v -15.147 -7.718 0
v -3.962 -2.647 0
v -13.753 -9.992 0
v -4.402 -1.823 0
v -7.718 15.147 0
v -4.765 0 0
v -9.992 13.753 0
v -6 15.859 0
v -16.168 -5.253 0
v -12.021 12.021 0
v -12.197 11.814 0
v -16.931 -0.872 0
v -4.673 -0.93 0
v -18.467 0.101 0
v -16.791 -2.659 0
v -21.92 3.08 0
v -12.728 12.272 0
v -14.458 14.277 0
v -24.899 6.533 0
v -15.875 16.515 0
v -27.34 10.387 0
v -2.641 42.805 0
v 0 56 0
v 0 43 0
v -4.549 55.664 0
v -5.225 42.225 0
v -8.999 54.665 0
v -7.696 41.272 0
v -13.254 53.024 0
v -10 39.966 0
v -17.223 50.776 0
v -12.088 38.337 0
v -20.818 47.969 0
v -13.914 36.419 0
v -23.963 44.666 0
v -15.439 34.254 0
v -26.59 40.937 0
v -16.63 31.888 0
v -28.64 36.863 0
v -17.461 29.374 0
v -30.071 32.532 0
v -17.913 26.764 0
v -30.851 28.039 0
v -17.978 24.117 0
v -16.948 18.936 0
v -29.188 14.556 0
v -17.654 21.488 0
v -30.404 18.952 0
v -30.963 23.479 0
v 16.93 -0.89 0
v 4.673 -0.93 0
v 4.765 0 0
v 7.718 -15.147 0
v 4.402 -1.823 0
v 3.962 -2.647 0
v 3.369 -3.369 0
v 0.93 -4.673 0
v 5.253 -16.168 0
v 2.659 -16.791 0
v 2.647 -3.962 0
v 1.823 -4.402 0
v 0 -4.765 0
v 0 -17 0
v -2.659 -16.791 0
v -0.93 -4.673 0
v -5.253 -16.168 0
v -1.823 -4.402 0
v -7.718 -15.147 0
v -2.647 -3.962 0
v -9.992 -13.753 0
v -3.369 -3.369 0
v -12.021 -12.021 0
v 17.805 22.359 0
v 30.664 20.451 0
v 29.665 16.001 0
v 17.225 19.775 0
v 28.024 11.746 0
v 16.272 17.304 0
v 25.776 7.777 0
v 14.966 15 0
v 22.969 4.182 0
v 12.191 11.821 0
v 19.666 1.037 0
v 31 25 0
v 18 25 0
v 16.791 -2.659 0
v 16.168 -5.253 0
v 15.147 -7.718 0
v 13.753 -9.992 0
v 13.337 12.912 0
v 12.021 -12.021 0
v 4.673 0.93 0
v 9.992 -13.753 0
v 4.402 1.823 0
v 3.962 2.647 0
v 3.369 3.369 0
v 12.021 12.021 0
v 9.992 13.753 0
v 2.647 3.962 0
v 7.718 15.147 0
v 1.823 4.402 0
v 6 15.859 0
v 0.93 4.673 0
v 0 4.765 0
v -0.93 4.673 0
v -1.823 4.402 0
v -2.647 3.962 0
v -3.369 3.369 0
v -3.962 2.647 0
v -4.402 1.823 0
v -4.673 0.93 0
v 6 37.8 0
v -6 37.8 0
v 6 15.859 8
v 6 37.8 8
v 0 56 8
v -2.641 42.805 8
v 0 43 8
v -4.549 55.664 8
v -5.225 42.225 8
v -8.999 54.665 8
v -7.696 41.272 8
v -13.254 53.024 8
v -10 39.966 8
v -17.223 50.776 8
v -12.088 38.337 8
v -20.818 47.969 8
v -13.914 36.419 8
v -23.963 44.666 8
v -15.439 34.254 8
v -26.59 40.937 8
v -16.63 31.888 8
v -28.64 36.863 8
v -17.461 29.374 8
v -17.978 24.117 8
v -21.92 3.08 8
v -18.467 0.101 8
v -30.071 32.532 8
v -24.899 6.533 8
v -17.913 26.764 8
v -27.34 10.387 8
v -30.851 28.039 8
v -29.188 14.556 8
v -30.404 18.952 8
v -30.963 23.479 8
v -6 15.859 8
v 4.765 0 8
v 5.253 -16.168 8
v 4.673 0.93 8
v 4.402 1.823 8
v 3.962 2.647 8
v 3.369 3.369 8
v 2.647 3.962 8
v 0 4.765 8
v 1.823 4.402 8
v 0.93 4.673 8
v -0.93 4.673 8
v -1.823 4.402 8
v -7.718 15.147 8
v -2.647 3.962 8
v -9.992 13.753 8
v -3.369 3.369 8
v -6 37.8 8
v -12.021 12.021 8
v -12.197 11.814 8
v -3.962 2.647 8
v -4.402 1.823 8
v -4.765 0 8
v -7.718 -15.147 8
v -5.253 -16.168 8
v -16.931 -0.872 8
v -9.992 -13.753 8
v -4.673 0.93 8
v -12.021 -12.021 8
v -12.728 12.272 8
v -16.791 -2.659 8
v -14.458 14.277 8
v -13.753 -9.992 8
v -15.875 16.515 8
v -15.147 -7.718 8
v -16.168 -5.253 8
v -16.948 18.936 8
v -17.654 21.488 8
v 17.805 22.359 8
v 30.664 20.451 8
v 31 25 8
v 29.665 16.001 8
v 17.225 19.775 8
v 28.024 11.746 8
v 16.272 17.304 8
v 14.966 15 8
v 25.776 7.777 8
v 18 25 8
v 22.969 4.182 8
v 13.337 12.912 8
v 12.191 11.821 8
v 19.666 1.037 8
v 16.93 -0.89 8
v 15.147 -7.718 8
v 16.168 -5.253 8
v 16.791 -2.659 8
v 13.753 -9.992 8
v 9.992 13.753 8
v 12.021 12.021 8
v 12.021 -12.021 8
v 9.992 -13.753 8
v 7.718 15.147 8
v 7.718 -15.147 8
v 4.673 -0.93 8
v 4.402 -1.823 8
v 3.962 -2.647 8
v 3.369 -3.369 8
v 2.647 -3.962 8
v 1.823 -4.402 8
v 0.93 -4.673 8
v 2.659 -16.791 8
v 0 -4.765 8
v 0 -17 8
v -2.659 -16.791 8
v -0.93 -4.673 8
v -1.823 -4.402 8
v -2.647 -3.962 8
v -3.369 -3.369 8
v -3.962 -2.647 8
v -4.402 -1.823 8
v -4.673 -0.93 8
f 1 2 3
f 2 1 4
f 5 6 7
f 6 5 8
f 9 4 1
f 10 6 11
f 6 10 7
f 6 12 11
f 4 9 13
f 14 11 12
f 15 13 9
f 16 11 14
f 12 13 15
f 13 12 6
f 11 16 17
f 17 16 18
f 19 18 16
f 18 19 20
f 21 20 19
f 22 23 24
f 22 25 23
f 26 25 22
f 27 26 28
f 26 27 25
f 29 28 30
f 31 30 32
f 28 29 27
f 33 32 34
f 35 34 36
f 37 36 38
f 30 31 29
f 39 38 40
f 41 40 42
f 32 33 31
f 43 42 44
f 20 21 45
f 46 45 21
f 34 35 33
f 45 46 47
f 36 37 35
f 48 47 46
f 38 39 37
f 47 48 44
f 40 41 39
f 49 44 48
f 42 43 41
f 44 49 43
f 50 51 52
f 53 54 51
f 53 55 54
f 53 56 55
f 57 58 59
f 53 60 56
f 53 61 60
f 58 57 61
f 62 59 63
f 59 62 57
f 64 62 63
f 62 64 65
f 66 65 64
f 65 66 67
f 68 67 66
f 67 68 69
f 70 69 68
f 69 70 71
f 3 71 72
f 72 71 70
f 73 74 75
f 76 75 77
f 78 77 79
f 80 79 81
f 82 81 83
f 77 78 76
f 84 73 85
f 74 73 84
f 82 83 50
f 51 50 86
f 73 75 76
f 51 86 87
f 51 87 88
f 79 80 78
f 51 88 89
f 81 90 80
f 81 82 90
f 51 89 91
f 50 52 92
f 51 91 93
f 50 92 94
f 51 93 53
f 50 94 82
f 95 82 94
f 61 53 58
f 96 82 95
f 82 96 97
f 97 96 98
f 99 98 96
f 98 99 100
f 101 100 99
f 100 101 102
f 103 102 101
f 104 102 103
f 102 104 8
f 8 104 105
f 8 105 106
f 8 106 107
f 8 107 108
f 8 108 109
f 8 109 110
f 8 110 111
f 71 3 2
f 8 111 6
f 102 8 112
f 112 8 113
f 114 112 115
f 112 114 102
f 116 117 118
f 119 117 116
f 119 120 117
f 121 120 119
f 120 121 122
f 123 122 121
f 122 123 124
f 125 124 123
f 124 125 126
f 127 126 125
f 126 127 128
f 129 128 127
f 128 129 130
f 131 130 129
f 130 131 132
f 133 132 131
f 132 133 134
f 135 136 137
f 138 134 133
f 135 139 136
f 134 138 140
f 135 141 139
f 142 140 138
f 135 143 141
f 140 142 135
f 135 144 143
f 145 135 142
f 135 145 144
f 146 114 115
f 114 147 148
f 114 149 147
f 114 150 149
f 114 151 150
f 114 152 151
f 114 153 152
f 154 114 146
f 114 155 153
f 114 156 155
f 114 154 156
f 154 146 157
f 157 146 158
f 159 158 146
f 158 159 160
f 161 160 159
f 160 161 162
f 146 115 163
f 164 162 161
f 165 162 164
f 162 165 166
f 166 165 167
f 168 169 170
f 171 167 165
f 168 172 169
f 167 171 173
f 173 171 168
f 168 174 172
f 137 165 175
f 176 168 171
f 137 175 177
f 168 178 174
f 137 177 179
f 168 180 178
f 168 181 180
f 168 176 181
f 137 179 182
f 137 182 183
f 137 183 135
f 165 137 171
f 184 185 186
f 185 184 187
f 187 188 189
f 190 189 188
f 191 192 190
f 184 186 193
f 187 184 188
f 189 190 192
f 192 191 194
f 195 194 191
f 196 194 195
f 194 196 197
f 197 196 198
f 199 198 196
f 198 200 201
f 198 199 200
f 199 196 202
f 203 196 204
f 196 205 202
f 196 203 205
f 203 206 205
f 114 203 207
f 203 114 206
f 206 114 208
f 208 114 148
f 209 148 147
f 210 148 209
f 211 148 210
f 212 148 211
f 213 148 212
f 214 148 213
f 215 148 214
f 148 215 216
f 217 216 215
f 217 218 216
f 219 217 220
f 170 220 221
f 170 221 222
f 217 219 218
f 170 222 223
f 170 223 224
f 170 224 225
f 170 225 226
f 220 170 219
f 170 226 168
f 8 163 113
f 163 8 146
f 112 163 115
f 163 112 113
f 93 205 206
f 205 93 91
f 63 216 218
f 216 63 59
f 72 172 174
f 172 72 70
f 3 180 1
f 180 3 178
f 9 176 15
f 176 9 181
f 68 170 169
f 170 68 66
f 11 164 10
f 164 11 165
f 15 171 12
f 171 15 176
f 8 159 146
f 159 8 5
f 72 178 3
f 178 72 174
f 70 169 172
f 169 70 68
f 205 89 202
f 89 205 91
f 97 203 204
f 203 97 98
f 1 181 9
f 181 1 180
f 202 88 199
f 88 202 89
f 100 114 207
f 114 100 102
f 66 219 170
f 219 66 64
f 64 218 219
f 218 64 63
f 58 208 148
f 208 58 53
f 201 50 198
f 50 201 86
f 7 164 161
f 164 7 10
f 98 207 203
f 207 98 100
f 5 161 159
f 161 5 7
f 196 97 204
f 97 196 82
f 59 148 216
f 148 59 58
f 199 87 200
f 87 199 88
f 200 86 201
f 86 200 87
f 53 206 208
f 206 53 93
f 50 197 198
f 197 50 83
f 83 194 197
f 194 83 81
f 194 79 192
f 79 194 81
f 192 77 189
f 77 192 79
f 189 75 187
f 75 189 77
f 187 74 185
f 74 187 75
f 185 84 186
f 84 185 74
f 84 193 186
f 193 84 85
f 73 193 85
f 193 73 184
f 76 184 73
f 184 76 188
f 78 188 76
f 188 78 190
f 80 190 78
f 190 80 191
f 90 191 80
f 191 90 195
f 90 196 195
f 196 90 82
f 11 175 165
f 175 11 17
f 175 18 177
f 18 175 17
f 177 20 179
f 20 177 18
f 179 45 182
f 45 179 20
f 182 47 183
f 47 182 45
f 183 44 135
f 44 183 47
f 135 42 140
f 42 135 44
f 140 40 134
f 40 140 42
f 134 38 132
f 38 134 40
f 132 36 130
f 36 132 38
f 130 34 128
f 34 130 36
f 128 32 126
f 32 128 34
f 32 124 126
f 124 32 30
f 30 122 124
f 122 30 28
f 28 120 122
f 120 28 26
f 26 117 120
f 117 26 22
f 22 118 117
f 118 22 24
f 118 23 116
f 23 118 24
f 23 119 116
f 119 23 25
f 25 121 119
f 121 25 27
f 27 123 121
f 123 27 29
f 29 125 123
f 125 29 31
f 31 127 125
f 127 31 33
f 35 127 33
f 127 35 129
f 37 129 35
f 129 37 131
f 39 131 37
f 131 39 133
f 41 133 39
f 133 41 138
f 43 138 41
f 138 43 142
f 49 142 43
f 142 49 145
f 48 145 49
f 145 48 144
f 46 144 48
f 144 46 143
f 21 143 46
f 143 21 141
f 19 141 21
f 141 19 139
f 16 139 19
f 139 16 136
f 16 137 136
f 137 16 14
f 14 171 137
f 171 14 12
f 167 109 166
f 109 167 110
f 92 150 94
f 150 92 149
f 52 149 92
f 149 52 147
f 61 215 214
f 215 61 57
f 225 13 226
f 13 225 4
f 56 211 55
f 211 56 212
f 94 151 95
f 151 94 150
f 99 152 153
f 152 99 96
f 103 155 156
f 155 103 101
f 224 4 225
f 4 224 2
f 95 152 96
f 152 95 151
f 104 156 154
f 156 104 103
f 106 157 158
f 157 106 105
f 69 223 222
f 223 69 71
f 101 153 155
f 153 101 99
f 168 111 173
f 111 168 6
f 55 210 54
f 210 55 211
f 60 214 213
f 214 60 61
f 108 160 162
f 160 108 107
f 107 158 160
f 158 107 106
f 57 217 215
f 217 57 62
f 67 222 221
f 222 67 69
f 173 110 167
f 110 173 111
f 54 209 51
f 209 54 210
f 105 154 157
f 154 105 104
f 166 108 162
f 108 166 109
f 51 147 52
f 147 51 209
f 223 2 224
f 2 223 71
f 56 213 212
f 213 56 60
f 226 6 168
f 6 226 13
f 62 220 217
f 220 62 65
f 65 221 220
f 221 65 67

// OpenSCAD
$fn = 32;

// ----------------------------------------------------------------------
// Hook: 50 mm shank into a 18 mm curl, 8 mm thick
// ----------------------------------------------------------------------

// --- parameters (mm) ---
shank_len = 50;           // shank length from the boss centre
shank_w = 12;             // shank width
boss_d = 34;              // boss diameter
bore_d = 9.53;            // boss bore
curl_in = 18;             // curl inner radius
curl_out = 31;            // curl outer radius
curl_sweep = 270;         // curl sweep angle
hook_t = 8;               // hook thickness

shank_profile = [[-6, 37.8], [6, 37.8], [6, 15], [-6, 15]];
boss_profile = [[17, 0], [16.791, 2.659], [16.168, 5.253], [15.147, 7.718], [13.753, 9.992], [12.021, 12.021], [9.992, 13.753], [7.718, 15.147], [5.253, 16.168], [2.659, 16.791], [0, 17], [-2.659, 16.791], [-5.253, 16.168], [-7.718, 15.147], [-9.992, 13.753], [-12.021, 12.021], [-13.753, 9.992], [-15.147, 7.718], [-16.168, 5.253], [-16.791, 2.659], [-17, 0], [-16.791, -2.659], [-16.168, -5.253], [-15.147, -7.718], [-13.753, -9.992], [-12.021, -12.021], [-9.992, -13.753], [-7.718, -15.147], [-5.253, -16.168], [-2.659, -16.791], [0, -17], [2.659, -16.791], [5.253, -16.168], [7.718, -15.147], [9.992, -13.753], [12.021, -12.021], [13.753, -9.992], [15.147, -7.718], [16.168, -5.253], [16.791, -2.659]];
curl_profile = [[0, 56], [-4.549, 55.664], [-8.999, 54.665], [-13.254, 53.024], [-17.223, 50.776], [-20.818, 47.969], [-23.963, 44.666], [-26.59, 40.937], [-28.64, 36.863], [-30.071, 32.532], [-30.851, 28.039], [-30.963, 23.479], [-30.404, 18.952], [-29.188, 14.556], [-27.34, 10.387], [-24.899, 6.533], [-21.92, 3.08], [-18.467, 0.101], [-14.613, -2.34], [-10.444, -4.188], [-6.048, -5.404], [-1.521, -5.963], [3.039, -5.851], [7.532, -5.071], [11.863, -3.64], [15.937, -1.59], [19.666, 1.037], [22.969, 4.182], [25.776, 7.777], [28.024, 11.746], [29.665, 16.001], [30.664, 20.451], [31, 25], [18, 25], [17.805, 22.359], [17.225, 19.775], [16.272, 17.304], [14.966, 15], [13.337, 12.912], [11.419, 11.086], [9.254, 9.561], [6.888, 8.37], [4.374, 7.539], [1.764, 7.087], [-0.883, 7.022], [-3.512, 7.346], [-6.064, 8.052], [-8.485, 9.125], [-10.723, 10.542], [-12.728, 12.272], [-14.458, 14.277], [-15.875, 16.515], [-16.948, 18.936], [-17.654, 21.488], [-17.978, 24.117], [-17.913, 26.764], [-17.461, 29.374], [-16.63, 31.888], [-15.439, 34.254], [-13.914, 36.419], [-12.088, 38.337], [-10, 39.966], [-7.696, 41.272], [-5.225, 42.225], [-2.641, 42.805], [0, 43]];

difference() {
  union() {
    /* three overlapping outlines: shank, boss and the smooth curl */
    linear_extrude(height = hook_t) polygon(shank_profile);
    linear_extrude(height = hook_t) polygon(boss_profile);
    linear_extrude(height = hook_t) polygon(curl_profile);
  }
  translate([0, 0, -2.5]) cylinder(h = hook_t + 5, d = bore_d);
}
